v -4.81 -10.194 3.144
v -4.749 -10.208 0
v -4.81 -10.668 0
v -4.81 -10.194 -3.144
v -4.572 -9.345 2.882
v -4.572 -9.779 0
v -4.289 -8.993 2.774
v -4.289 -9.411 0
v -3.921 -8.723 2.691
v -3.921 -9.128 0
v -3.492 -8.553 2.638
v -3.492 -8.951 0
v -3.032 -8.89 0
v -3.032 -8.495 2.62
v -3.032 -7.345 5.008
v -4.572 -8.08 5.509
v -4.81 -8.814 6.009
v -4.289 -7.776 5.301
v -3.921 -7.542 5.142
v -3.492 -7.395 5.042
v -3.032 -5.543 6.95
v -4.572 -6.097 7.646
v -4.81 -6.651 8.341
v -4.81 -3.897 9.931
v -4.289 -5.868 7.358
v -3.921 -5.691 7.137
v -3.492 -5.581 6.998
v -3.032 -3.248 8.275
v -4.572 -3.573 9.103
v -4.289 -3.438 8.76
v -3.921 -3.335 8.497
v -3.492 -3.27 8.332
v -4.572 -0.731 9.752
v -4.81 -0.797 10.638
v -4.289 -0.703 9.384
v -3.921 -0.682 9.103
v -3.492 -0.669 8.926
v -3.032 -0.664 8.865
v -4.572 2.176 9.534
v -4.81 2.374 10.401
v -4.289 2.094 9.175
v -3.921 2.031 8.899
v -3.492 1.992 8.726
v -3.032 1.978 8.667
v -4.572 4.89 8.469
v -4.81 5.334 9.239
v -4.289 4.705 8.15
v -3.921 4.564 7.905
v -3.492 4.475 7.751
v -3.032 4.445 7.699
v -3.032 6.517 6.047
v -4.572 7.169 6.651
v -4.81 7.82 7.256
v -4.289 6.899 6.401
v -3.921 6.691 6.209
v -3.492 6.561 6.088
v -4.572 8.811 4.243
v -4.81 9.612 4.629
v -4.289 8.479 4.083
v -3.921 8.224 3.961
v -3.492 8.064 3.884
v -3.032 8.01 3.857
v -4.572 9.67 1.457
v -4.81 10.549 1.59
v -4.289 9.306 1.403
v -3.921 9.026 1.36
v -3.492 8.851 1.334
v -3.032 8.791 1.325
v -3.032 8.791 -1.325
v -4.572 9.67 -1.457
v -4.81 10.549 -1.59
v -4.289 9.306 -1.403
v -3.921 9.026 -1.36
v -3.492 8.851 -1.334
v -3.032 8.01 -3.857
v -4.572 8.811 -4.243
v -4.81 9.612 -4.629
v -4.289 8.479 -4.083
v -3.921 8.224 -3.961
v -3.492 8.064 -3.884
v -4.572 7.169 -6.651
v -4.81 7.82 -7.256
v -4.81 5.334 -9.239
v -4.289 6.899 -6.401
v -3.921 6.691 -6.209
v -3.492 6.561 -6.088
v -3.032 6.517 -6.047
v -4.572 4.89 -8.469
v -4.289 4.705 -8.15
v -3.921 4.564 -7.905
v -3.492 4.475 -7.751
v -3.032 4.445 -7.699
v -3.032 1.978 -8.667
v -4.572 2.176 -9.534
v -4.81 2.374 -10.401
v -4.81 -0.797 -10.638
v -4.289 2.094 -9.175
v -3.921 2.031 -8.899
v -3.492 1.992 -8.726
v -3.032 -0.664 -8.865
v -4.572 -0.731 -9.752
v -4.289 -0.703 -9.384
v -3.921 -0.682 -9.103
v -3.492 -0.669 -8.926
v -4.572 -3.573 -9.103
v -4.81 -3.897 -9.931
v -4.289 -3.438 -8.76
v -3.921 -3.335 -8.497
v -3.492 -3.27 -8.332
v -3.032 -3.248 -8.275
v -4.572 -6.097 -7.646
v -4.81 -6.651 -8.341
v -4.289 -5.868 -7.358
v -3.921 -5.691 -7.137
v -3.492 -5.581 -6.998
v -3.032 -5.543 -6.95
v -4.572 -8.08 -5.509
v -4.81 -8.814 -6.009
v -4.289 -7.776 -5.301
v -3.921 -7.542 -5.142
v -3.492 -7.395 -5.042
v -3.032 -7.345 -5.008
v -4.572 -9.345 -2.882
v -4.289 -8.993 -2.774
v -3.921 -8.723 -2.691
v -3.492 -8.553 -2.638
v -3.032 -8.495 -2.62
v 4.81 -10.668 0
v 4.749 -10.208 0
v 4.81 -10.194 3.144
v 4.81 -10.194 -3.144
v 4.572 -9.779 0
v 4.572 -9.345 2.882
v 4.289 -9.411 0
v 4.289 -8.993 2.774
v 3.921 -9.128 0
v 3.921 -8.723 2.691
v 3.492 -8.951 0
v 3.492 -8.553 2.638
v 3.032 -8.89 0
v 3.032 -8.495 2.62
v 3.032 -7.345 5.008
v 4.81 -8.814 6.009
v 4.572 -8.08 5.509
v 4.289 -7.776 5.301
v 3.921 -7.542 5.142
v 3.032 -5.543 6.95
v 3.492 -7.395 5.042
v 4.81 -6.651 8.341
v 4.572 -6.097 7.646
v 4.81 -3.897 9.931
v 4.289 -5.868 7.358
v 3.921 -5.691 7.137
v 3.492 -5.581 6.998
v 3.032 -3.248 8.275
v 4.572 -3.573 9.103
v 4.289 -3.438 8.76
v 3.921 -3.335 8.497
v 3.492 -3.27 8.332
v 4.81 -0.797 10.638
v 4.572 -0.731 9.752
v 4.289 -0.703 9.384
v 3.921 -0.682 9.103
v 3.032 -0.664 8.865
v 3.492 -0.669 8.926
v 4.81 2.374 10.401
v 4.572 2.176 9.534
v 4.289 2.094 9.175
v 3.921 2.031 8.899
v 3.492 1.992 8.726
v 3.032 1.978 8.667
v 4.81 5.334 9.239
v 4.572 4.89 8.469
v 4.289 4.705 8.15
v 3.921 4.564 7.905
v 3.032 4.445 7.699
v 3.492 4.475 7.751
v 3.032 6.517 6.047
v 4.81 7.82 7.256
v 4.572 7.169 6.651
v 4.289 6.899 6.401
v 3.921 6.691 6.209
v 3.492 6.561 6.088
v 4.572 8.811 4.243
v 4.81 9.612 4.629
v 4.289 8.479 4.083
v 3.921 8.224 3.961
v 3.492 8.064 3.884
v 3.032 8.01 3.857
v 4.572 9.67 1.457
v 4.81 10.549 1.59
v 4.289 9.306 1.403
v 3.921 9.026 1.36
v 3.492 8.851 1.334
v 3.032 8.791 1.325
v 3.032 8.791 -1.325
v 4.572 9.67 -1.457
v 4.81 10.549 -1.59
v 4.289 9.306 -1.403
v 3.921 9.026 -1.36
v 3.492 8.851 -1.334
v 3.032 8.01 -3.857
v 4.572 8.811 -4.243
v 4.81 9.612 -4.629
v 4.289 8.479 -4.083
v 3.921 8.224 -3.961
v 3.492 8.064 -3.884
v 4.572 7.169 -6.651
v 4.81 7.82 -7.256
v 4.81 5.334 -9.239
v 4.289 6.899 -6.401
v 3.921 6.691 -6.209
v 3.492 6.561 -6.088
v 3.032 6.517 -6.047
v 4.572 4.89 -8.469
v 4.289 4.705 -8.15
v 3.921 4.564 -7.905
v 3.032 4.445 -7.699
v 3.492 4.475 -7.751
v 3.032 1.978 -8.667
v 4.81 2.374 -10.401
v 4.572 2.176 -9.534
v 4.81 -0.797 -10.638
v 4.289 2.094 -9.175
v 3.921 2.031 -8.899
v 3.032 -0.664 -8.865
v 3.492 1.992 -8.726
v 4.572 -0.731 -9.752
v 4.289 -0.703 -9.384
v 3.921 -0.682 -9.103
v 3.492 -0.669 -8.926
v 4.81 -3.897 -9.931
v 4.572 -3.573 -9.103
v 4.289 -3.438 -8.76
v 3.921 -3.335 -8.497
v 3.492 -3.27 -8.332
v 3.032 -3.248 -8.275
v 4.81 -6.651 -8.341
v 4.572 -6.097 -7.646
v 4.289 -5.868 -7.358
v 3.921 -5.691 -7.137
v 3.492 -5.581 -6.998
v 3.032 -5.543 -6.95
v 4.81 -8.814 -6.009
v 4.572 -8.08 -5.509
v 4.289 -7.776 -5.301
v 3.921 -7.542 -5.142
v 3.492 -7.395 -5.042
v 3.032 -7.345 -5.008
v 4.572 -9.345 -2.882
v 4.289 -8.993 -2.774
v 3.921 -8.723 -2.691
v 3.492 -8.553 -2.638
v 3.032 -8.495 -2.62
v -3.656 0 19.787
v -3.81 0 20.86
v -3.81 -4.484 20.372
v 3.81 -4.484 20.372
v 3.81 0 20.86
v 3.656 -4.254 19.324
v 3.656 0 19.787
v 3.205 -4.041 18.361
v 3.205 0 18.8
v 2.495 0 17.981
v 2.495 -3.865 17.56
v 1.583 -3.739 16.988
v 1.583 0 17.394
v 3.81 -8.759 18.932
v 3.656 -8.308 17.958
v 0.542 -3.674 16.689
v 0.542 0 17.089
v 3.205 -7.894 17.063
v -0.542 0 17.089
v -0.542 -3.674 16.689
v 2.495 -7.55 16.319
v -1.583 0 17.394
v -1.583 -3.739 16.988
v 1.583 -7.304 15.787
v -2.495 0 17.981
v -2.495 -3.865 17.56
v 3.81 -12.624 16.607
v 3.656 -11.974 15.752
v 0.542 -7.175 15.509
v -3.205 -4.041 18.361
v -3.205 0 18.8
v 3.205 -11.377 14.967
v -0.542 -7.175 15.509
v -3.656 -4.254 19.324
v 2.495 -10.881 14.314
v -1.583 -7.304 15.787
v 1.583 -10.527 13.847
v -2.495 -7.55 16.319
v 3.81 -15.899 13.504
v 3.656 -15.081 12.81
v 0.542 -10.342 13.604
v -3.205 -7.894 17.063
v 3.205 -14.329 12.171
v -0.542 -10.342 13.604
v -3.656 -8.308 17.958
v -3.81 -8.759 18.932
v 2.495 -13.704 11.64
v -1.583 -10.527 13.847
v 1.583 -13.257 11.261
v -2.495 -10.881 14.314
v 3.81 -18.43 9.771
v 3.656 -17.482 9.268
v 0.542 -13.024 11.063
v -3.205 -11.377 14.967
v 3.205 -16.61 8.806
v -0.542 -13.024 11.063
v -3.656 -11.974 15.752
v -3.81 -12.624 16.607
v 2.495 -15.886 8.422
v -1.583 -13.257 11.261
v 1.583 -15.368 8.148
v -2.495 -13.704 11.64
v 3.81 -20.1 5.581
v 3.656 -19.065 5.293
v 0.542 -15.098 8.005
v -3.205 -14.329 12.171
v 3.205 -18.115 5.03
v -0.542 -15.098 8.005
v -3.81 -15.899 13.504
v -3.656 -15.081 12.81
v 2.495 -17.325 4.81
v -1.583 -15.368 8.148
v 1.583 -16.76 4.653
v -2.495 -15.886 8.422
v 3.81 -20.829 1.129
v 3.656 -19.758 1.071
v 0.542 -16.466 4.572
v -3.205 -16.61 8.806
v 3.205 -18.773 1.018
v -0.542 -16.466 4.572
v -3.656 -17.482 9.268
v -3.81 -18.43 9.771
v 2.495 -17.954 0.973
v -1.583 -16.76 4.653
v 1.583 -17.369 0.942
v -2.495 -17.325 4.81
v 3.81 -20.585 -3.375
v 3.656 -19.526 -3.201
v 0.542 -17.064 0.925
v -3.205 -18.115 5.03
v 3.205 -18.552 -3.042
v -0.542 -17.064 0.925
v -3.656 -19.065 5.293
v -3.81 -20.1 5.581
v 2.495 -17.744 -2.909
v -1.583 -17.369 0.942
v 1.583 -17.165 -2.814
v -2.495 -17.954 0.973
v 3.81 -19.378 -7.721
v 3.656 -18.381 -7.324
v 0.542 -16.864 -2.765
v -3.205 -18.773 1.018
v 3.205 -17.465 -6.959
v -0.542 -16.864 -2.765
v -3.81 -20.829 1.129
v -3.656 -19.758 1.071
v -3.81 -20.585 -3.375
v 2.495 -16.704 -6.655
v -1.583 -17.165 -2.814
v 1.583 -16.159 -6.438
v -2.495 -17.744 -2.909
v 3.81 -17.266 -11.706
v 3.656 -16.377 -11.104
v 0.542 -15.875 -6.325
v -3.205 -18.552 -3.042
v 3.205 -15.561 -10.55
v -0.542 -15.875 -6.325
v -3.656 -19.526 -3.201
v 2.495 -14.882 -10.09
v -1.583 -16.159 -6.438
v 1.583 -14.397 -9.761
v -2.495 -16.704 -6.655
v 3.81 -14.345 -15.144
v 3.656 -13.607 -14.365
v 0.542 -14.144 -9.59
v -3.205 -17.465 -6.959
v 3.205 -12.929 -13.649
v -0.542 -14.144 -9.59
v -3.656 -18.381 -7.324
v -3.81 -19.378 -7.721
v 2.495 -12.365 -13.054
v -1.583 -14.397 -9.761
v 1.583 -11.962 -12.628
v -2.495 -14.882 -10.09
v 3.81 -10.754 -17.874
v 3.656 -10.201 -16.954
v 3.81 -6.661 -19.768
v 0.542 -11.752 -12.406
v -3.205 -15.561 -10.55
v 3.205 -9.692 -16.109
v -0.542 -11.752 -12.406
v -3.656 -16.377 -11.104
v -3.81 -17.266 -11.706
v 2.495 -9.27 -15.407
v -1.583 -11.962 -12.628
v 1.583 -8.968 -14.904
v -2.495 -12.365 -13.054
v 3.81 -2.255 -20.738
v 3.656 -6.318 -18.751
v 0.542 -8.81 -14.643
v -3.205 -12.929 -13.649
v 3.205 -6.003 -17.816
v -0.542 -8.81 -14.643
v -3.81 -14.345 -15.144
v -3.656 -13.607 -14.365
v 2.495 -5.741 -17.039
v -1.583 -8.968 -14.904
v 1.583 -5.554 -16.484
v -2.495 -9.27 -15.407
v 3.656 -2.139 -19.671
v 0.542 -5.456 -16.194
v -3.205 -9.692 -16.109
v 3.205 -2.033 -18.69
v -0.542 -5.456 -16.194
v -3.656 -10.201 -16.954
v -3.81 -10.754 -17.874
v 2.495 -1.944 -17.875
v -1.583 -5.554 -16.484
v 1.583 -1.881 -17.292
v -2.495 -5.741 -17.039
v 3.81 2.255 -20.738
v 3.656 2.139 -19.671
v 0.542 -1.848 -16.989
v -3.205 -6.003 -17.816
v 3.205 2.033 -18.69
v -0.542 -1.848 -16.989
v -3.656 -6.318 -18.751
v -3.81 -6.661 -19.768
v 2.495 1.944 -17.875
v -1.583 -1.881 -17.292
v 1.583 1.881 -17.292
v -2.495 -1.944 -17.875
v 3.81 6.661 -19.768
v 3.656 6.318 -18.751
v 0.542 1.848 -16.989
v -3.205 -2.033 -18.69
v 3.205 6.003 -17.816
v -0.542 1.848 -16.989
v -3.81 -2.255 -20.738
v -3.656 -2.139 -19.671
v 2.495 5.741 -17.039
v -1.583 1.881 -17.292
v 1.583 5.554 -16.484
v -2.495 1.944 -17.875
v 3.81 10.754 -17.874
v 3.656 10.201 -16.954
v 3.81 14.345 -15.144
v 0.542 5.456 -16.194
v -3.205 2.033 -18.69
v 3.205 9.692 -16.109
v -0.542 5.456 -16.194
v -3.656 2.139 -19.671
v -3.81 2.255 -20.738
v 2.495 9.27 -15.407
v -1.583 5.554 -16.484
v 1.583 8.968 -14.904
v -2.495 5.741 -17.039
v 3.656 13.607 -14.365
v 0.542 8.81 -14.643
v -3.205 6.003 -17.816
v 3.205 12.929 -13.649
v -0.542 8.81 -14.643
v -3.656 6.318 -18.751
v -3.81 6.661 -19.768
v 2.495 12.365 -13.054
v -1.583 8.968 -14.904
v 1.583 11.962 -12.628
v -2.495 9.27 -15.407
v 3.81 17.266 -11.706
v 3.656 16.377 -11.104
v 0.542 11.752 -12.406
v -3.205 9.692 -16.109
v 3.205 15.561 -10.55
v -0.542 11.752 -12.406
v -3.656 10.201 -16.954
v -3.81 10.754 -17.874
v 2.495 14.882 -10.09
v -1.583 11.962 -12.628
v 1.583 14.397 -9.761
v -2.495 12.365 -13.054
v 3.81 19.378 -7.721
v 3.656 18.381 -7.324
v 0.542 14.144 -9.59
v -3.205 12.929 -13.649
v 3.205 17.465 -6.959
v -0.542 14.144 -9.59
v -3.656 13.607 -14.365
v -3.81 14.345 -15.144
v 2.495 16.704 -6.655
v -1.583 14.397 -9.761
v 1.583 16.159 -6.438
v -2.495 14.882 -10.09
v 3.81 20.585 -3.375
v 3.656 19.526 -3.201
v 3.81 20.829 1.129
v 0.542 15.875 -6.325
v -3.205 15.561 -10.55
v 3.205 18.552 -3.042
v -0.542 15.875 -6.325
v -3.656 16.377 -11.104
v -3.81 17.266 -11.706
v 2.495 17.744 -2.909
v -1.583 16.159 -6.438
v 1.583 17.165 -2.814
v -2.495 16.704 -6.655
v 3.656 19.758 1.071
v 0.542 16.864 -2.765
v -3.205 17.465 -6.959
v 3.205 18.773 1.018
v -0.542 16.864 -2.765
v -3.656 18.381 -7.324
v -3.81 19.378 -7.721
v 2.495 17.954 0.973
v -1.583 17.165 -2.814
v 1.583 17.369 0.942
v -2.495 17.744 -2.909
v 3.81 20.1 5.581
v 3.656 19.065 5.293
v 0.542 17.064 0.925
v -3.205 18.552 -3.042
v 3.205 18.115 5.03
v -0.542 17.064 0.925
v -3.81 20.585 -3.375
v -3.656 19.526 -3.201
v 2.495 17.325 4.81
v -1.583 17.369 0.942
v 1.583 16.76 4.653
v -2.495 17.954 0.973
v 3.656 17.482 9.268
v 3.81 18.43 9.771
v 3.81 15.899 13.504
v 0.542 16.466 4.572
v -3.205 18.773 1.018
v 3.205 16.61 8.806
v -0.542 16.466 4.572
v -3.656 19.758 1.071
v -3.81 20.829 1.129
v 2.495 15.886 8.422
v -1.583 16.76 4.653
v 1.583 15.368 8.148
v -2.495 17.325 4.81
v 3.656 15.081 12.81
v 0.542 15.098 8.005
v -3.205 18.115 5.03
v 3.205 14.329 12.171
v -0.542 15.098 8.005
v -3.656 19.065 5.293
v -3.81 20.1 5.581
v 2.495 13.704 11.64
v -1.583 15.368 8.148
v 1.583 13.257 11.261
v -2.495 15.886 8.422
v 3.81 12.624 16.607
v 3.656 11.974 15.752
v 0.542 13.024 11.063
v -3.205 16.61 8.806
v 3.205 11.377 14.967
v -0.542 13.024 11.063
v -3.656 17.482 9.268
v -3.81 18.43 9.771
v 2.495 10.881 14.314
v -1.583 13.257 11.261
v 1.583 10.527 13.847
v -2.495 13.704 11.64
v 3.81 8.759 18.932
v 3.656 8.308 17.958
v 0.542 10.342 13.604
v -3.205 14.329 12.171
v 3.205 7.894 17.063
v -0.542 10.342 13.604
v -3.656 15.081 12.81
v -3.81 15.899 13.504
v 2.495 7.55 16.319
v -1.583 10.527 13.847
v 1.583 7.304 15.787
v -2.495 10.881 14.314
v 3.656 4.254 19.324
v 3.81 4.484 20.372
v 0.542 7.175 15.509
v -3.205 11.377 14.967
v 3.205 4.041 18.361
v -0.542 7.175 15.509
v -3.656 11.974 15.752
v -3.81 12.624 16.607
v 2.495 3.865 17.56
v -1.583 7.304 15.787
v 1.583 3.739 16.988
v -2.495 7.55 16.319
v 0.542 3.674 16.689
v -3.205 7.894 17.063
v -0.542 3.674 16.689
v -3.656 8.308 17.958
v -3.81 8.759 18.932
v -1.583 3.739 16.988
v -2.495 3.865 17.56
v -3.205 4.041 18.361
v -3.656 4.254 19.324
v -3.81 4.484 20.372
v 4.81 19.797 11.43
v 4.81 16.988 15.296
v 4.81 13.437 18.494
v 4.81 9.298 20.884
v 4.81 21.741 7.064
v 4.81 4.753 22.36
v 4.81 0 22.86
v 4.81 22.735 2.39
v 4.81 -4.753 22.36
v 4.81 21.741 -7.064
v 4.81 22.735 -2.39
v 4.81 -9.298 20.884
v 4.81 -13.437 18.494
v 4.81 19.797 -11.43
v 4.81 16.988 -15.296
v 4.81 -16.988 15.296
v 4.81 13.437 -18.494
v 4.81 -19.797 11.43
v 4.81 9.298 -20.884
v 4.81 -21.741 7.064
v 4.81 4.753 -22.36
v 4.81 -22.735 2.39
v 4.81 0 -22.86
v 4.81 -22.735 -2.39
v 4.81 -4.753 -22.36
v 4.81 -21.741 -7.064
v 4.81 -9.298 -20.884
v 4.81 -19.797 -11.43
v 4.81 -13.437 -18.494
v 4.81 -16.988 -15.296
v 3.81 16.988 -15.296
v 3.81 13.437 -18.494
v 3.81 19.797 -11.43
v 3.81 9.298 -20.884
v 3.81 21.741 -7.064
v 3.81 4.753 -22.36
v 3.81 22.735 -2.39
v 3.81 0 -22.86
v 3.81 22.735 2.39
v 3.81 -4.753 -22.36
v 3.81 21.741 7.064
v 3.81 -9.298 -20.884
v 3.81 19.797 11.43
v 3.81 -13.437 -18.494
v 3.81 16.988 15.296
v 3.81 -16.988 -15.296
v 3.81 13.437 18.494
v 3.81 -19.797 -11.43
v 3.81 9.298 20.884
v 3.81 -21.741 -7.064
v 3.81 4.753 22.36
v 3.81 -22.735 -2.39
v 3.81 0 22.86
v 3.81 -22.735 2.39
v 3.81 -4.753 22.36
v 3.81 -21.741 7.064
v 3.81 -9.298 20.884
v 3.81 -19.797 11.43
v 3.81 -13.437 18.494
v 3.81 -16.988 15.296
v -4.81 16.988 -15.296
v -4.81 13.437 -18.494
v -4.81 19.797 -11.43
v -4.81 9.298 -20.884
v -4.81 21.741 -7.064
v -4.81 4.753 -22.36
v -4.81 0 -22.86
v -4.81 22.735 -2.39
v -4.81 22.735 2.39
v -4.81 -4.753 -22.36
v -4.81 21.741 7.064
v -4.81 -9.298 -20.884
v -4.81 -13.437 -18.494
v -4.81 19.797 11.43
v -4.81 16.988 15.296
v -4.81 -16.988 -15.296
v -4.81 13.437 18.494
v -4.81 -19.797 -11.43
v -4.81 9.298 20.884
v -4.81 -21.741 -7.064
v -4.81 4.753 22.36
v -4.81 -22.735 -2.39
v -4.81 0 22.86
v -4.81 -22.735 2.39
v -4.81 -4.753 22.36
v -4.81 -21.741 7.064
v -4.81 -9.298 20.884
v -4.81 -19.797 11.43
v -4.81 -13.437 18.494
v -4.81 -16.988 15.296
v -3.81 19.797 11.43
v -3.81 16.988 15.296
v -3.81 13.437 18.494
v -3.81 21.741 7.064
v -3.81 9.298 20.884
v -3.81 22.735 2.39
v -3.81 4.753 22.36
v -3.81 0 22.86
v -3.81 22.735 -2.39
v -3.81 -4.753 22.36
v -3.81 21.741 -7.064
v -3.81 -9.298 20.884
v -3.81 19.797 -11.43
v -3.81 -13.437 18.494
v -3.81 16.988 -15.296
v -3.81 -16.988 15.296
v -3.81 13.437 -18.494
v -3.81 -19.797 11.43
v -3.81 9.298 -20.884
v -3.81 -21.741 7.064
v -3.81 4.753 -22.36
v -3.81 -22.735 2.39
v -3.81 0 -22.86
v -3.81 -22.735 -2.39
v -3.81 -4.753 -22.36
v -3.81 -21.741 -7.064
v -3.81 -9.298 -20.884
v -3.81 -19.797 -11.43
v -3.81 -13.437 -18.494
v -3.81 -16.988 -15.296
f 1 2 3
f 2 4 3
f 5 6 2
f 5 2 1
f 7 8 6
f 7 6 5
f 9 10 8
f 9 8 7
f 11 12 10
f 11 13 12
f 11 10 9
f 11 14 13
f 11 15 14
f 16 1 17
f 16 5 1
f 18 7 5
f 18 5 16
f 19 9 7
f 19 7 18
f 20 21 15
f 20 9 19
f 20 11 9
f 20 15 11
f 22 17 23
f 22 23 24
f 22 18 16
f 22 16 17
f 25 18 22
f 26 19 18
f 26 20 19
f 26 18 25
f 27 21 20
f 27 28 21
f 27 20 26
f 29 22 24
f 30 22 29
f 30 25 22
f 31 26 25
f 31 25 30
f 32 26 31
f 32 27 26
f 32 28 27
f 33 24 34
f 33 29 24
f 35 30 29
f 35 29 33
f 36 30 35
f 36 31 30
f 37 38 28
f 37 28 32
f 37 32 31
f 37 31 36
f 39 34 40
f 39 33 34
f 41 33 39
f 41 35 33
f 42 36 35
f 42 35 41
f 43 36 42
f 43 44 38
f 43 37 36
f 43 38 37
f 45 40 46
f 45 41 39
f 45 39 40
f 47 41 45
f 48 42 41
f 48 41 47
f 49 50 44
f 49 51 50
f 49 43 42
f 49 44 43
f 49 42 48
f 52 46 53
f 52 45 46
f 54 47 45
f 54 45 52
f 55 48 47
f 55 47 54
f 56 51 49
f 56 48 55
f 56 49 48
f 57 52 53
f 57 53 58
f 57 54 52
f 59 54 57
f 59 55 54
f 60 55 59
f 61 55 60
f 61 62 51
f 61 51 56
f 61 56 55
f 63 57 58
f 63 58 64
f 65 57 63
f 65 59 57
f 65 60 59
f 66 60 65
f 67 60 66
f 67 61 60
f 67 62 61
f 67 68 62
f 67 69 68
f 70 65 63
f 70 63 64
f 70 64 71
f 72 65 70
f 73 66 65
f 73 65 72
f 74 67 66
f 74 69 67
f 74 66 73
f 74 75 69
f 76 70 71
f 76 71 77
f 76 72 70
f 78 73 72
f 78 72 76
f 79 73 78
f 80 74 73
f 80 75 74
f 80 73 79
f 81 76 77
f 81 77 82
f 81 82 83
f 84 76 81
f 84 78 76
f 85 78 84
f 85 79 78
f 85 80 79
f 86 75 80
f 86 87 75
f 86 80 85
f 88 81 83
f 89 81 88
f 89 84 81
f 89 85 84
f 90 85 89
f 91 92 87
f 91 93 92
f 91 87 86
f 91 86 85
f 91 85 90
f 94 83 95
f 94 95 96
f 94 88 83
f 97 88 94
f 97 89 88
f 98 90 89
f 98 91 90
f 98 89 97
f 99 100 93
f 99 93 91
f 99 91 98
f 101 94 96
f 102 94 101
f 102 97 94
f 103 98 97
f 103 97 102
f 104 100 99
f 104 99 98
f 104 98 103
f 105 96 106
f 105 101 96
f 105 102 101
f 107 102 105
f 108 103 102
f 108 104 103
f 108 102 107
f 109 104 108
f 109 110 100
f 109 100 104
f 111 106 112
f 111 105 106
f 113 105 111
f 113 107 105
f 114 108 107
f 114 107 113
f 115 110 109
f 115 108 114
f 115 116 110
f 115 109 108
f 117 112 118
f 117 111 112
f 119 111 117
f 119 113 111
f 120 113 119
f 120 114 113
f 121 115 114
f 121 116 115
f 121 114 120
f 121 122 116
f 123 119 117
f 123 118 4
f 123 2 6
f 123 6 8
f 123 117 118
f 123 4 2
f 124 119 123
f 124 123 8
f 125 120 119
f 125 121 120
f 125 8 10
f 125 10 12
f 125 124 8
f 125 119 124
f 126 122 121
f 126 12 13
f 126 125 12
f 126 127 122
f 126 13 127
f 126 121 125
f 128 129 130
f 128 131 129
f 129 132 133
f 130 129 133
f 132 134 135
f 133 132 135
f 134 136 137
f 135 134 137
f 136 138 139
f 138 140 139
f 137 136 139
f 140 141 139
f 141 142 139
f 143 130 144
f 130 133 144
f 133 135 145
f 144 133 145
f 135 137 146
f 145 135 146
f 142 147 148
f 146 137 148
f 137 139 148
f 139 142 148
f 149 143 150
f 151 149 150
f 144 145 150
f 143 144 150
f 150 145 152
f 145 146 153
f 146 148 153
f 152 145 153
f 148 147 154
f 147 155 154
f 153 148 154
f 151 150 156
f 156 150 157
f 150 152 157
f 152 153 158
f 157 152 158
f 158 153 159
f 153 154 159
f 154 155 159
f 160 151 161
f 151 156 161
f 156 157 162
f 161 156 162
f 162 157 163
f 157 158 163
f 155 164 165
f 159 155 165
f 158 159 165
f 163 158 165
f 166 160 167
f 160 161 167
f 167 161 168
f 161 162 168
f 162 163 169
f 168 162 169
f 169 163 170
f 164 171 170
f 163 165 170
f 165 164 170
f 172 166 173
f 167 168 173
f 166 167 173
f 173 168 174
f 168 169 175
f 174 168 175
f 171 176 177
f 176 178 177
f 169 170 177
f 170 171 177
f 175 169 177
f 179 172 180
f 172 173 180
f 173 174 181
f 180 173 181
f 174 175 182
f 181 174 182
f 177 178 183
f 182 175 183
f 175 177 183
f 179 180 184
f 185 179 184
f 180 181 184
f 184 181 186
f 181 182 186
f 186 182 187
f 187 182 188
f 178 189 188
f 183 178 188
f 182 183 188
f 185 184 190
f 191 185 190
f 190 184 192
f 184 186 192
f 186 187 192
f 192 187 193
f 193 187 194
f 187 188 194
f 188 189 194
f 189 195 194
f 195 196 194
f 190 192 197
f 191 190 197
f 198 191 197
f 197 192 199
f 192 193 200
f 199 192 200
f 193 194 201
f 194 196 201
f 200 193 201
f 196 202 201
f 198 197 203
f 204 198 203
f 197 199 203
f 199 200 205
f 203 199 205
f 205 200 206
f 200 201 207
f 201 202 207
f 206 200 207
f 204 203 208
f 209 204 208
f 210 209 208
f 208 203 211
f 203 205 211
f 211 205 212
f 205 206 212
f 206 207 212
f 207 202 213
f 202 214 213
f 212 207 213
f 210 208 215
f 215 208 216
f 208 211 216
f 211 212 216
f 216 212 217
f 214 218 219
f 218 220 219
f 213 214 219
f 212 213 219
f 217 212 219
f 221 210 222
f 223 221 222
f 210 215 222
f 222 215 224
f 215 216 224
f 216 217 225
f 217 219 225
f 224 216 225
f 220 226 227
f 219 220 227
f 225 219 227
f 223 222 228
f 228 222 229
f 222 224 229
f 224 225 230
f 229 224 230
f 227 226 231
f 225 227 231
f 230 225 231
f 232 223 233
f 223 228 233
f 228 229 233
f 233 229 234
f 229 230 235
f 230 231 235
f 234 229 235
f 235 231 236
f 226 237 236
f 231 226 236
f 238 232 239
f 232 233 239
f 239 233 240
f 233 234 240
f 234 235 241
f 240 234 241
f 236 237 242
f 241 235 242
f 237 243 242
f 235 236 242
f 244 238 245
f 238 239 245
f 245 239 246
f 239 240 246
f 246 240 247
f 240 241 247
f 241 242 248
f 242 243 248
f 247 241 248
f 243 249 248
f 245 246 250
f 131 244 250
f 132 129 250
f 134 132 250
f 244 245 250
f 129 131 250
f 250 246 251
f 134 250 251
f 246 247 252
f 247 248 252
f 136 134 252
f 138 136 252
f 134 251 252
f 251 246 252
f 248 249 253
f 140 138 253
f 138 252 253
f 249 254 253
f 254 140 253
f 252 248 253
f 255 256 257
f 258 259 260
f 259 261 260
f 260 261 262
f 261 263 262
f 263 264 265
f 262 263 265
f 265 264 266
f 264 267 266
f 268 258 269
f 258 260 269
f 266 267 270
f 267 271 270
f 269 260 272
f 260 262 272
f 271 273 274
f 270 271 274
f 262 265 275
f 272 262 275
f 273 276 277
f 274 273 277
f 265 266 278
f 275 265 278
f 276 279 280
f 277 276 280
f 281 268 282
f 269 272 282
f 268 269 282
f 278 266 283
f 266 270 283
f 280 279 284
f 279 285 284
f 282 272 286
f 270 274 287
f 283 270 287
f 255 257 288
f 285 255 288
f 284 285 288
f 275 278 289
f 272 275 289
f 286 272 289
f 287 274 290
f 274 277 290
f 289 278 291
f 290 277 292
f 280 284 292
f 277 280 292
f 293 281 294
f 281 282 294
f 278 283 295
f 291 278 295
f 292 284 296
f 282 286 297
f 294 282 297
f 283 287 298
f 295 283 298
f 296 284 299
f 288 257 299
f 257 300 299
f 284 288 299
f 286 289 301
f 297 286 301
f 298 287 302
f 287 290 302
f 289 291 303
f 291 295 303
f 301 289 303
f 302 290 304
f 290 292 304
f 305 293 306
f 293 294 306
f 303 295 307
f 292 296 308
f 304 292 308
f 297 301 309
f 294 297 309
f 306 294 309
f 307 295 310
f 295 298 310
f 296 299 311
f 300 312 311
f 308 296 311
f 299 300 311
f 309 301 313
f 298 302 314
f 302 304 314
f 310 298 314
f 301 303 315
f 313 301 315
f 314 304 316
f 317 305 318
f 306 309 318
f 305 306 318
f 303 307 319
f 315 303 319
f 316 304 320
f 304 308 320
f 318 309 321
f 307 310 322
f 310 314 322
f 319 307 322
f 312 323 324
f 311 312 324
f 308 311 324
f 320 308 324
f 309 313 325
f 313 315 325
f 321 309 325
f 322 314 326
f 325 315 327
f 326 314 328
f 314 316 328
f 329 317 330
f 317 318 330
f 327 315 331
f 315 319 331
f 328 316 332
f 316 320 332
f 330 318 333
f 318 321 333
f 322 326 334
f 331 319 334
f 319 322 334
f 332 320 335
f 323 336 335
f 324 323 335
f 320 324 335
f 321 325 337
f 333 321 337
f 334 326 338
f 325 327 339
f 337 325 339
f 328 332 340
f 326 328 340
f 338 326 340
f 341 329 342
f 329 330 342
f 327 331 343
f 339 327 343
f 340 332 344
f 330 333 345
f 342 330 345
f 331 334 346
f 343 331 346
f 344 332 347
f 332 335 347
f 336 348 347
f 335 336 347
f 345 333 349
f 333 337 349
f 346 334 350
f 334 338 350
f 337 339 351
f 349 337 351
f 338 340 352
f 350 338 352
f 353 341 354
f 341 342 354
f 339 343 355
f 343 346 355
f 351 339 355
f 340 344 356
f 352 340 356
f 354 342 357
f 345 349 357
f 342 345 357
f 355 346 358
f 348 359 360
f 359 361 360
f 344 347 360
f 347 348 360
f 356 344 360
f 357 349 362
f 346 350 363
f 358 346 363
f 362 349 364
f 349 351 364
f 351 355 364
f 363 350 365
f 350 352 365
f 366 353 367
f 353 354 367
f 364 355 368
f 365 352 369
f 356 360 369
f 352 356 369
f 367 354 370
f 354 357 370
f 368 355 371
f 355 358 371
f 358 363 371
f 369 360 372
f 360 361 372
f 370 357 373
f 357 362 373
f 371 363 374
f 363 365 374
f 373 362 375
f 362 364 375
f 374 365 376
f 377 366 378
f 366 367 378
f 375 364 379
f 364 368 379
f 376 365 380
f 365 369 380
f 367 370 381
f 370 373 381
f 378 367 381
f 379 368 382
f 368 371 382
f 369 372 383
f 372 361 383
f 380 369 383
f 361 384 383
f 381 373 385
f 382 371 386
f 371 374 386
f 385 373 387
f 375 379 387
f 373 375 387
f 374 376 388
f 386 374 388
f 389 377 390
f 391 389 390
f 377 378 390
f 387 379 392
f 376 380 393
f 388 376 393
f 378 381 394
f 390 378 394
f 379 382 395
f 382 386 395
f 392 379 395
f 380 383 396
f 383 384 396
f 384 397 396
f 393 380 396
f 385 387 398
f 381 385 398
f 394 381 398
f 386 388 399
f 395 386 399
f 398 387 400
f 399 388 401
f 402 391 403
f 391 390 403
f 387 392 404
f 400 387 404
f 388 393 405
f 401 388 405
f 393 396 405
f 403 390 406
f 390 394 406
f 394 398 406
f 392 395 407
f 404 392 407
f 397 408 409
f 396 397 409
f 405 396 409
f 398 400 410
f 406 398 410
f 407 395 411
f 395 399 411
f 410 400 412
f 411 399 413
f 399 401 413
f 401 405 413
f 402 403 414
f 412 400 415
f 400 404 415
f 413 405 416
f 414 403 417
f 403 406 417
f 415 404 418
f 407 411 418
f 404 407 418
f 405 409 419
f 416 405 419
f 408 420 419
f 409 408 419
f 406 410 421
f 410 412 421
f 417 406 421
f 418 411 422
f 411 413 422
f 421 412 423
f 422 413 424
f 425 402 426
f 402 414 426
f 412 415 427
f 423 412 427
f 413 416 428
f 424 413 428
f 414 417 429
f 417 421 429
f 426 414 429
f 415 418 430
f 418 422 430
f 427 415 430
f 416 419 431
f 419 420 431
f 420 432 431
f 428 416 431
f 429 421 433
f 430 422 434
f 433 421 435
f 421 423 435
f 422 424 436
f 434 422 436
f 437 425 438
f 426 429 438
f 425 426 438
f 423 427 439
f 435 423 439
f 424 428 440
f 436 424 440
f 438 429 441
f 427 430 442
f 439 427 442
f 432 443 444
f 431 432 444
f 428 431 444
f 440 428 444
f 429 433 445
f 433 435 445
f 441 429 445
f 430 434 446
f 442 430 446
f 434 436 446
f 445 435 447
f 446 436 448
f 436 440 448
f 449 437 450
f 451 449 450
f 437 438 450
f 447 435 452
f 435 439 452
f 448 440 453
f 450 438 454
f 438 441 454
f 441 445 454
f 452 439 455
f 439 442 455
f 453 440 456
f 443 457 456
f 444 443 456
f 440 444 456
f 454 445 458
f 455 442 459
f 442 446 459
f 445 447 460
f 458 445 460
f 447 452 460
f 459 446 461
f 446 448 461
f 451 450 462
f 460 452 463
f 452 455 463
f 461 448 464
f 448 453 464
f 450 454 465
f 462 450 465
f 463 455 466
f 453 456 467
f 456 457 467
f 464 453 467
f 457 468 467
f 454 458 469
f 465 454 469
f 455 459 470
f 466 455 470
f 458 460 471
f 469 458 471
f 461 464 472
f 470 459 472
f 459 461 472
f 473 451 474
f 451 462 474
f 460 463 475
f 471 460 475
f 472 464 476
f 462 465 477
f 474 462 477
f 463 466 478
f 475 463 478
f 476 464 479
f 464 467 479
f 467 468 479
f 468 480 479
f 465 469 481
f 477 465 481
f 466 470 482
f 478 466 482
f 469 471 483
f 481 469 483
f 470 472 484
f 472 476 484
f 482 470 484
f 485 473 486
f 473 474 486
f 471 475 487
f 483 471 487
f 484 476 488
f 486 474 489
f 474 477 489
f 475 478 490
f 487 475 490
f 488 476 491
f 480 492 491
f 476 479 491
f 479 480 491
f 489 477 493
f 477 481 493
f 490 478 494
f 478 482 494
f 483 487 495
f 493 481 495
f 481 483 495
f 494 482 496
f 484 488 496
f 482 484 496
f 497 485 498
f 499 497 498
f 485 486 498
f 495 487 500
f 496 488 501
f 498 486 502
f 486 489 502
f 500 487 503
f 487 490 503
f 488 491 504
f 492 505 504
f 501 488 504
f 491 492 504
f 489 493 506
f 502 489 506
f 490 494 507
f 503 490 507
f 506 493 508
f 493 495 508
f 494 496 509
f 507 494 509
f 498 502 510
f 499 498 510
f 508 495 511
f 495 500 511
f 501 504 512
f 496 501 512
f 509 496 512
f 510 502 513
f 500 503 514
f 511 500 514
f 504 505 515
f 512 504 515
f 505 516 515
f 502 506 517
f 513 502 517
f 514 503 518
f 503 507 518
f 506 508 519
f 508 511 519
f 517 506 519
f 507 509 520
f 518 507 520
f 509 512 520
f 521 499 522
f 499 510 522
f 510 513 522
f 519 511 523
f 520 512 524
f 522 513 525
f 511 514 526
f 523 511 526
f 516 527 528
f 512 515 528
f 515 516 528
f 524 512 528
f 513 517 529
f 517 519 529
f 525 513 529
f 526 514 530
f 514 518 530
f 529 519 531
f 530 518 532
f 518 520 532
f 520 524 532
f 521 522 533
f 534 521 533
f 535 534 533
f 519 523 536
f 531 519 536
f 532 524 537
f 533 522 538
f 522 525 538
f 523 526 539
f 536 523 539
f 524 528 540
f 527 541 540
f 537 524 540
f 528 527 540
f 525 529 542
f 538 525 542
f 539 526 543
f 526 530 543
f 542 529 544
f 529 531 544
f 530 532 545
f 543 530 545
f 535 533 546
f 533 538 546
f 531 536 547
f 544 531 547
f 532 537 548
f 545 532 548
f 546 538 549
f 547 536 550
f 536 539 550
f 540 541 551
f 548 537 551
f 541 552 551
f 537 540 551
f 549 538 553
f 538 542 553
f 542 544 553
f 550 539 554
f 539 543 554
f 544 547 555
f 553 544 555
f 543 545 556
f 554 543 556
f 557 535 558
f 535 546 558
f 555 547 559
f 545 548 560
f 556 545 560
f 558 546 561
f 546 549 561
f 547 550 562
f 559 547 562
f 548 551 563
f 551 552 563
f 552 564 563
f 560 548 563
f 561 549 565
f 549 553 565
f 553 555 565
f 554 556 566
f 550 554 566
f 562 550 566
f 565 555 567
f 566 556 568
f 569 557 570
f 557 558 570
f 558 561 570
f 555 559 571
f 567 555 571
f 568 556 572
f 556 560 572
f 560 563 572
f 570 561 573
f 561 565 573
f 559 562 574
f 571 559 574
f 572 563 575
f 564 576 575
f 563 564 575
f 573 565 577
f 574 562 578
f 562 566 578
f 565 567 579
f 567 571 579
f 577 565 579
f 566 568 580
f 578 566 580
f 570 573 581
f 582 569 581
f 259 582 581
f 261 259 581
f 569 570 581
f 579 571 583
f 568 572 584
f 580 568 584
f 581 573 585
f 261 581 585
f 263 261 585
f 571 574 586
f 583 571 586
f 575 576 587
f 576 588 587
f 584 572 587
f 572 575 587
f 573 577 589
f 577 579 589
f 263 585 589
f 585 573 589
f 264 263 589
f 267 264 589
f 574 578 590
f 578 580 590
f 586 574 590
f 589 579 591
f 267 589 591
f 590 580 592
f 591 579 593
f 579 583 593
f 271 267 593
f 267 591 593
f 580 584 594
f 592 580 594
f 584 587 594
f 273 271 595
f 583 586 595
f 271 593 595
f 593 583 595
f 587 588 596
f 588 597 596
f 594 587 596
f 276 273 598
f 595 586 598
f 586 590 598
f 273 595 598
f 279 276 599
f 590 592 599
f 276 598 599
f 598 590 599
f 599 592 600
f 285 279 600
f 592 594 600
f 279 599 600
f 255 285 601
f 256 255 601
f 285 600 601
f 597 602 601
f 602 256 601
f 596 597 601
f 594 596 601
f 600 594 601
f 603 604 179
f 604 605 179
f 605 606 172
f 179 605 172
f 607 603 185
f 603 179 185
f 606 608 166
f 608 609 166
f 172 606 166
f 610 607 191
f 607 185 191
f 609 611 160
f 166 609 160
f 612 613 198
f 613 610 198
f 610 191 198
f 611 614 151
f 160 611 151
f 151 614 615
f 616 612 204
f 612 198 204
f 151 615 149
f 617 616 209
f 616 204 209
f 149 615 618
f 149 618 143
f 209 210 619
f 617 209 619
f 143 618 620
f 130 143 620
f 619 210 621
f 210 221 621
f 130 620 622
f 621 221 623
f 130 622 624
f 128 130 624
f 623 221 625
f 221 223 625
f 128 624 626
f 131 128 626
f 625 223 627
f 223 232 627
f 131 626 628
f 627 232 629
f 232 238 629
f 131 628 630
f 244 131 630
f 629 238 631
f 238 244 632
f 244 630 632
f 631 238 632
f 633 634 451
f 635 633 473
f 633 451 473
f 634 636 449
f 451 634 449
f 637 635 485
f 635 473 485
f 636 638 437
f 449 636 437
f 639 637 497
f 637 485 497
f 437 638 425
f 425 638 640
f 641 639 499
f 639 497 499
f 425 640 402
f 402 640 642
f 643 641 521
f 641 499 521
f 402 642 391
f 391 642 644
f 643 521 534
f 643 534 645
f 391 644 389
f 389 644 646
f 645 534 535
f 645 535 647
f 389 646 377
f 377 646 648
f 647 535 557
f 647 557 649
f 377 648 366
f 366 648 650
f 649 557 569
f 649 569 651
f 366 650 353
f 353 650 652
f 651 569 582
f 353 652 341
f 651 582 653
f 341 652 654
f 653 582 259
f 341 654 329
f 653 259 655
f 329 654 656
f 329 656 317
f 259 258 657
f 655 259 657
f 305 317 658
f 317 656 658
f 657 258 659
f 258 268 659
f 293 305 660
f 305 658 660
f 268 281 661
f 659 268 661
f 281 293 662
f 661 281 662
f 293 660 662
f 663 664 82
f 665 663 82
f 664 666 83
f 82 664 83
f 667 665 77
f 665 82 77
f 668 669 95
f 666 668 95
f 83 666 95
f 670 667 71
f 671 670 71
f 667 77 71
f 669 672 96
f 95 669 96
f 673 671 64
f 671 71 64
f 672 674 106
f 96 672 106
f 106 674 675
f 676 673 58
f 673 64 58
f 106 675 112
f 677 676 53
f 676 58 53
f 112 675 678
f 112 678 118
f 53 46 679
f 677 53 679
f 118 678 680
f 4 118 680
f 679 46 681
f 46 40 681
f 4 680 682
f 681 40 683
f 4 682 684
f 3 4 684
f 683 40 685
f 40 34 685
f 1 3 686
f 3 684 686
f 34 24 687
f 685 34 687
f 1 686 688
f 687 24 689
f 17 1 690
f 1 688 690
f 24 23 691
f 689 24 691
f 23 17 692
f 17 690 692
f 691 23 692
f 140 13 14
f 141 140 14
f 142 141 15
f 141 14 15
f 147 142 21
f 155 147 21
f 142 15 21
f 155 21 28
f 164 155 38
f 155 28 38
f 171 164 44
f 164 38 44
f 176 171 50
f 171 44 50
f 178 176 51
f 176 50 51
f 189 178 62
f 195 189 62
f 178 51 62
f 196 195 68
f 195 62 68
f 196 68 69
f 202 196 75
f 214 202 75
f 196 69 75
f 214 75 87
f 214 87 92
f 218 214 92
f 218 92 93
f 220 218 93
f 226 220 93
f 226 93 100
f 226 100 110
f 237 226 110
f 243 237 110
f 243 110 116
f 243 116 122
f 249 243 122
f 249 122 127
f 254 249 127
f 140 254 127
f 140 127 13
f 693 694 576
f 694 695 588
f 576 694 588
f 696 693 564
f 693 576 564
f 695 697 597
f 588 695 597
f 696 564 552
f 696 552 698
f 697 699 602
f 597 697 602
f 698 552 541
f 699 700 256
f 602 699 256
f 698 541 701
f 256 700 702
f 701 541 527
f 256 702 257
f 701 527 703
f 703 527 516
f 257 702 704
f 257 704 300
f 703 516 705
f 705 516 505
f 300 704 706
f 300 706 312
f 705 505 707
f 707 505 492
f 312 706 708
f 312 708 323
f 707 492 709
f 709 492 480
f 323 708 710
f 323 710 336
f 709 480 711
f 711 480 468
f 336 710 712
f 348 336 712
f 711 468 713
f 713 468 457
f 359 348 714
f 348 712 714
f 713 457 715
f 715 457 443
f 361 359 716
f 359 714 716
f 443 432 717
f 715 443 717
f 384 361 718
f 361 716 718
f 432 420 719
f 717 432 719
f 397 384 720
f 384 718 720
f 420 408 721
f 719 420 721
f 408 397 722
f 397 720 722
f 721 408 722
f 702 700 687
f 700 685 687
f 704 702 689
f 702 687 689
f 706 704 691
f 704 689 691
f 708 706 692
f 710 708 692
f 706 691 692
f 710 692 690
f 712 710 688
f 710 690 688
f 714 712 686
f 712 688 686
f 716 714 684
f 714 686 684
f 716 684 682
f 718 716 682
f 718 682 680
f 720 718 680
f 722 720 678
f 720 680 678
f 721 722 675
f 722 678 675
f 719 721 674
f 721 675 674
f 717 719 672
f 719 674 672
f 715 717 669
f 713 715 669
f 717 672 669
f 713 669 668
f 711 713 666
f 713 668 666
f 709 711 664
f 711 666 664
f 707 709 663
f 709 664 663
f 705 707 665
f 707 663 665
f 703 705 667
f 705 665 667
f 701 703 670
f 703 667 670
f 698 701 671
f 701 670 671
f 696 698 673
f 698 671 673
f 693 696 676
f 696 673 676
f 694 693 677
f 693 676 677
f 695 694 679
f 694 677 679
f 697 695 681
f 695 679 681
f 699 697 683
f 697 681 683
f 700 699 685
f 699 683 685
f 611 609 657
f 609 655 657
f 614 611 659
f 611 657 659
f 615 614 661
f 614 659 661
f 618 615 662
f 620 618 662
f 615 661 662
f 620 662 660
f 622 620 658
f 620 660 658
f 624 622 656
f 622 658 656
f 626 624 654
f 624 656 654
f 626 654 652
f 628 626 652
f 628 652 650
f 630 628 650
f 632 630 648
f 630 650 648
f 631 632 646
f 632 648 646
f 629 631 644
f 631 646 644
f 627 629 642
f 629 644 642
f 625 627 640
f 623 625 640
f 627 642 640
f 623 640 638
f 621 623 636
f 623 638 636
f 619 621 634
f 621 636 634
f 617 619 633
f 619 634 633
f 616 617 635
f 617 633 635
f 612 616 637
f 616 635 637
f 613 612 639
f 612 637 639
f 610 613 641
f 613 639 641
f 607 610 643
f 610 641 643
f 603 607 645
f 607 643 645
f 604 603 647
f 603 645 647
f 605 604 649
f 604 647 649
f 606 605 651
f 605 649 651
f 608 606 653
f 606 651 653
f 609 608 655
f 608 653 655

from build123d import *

# Parameters (mm, degrees)
F3_R     = 8.89
F4_DEPTH = 25.4
F5_R     = 1.778


with BuildPart() as f2:
    # F0 (on Front) → F2 (revolve)
    with BuildSketch(Plane.XZ):
        with BuildLine():
            Line((-3.81, 0), (0, 0))
            Line((0, 0), (3.81, 0))
            Line((3.81, 0), (3.81, 20.86))
            ThreePointArc((3.81, 20.86), (0, 17.05), (-3.81, 20.86))
            Line((-3.81, 20.86), (-3.81, 0))
        make_face()
        Polygon((-4.81, 0), (-3.81, 0), (-3.81, 20.86), (-3.81, 22.86), (-4.81, 22.86), align=None)
        Polygon((3.81, 20.86), (3.81, 0), (4.81, 0), (4.81, 22.86), (3.81, 22.86), align=None)
    revolve(axis=Axis((-0.3435998224, 0, 0), (1, 0, 0)))

    # F3 (on face) → F4 (cut)
    with BuildSketch(Plane(origin=(-4.81, 0, 0), x_dir=(0, -1, 0), z_dir=(-1, 0, 0))):
        Circle(F3_R)
    extrude(amount=-F4_DEPTH, mode=Mode.SUBTRACT)

    # F5
    f5_edges = [f2.edges().sort_by_distance(p)[0] for p in [
        (4.81, 8.89, 0),
        (-4.81, 8.89, 0),
    ]]
    fillet(f5_edges, radius=F5_R)


solid = f2.part
